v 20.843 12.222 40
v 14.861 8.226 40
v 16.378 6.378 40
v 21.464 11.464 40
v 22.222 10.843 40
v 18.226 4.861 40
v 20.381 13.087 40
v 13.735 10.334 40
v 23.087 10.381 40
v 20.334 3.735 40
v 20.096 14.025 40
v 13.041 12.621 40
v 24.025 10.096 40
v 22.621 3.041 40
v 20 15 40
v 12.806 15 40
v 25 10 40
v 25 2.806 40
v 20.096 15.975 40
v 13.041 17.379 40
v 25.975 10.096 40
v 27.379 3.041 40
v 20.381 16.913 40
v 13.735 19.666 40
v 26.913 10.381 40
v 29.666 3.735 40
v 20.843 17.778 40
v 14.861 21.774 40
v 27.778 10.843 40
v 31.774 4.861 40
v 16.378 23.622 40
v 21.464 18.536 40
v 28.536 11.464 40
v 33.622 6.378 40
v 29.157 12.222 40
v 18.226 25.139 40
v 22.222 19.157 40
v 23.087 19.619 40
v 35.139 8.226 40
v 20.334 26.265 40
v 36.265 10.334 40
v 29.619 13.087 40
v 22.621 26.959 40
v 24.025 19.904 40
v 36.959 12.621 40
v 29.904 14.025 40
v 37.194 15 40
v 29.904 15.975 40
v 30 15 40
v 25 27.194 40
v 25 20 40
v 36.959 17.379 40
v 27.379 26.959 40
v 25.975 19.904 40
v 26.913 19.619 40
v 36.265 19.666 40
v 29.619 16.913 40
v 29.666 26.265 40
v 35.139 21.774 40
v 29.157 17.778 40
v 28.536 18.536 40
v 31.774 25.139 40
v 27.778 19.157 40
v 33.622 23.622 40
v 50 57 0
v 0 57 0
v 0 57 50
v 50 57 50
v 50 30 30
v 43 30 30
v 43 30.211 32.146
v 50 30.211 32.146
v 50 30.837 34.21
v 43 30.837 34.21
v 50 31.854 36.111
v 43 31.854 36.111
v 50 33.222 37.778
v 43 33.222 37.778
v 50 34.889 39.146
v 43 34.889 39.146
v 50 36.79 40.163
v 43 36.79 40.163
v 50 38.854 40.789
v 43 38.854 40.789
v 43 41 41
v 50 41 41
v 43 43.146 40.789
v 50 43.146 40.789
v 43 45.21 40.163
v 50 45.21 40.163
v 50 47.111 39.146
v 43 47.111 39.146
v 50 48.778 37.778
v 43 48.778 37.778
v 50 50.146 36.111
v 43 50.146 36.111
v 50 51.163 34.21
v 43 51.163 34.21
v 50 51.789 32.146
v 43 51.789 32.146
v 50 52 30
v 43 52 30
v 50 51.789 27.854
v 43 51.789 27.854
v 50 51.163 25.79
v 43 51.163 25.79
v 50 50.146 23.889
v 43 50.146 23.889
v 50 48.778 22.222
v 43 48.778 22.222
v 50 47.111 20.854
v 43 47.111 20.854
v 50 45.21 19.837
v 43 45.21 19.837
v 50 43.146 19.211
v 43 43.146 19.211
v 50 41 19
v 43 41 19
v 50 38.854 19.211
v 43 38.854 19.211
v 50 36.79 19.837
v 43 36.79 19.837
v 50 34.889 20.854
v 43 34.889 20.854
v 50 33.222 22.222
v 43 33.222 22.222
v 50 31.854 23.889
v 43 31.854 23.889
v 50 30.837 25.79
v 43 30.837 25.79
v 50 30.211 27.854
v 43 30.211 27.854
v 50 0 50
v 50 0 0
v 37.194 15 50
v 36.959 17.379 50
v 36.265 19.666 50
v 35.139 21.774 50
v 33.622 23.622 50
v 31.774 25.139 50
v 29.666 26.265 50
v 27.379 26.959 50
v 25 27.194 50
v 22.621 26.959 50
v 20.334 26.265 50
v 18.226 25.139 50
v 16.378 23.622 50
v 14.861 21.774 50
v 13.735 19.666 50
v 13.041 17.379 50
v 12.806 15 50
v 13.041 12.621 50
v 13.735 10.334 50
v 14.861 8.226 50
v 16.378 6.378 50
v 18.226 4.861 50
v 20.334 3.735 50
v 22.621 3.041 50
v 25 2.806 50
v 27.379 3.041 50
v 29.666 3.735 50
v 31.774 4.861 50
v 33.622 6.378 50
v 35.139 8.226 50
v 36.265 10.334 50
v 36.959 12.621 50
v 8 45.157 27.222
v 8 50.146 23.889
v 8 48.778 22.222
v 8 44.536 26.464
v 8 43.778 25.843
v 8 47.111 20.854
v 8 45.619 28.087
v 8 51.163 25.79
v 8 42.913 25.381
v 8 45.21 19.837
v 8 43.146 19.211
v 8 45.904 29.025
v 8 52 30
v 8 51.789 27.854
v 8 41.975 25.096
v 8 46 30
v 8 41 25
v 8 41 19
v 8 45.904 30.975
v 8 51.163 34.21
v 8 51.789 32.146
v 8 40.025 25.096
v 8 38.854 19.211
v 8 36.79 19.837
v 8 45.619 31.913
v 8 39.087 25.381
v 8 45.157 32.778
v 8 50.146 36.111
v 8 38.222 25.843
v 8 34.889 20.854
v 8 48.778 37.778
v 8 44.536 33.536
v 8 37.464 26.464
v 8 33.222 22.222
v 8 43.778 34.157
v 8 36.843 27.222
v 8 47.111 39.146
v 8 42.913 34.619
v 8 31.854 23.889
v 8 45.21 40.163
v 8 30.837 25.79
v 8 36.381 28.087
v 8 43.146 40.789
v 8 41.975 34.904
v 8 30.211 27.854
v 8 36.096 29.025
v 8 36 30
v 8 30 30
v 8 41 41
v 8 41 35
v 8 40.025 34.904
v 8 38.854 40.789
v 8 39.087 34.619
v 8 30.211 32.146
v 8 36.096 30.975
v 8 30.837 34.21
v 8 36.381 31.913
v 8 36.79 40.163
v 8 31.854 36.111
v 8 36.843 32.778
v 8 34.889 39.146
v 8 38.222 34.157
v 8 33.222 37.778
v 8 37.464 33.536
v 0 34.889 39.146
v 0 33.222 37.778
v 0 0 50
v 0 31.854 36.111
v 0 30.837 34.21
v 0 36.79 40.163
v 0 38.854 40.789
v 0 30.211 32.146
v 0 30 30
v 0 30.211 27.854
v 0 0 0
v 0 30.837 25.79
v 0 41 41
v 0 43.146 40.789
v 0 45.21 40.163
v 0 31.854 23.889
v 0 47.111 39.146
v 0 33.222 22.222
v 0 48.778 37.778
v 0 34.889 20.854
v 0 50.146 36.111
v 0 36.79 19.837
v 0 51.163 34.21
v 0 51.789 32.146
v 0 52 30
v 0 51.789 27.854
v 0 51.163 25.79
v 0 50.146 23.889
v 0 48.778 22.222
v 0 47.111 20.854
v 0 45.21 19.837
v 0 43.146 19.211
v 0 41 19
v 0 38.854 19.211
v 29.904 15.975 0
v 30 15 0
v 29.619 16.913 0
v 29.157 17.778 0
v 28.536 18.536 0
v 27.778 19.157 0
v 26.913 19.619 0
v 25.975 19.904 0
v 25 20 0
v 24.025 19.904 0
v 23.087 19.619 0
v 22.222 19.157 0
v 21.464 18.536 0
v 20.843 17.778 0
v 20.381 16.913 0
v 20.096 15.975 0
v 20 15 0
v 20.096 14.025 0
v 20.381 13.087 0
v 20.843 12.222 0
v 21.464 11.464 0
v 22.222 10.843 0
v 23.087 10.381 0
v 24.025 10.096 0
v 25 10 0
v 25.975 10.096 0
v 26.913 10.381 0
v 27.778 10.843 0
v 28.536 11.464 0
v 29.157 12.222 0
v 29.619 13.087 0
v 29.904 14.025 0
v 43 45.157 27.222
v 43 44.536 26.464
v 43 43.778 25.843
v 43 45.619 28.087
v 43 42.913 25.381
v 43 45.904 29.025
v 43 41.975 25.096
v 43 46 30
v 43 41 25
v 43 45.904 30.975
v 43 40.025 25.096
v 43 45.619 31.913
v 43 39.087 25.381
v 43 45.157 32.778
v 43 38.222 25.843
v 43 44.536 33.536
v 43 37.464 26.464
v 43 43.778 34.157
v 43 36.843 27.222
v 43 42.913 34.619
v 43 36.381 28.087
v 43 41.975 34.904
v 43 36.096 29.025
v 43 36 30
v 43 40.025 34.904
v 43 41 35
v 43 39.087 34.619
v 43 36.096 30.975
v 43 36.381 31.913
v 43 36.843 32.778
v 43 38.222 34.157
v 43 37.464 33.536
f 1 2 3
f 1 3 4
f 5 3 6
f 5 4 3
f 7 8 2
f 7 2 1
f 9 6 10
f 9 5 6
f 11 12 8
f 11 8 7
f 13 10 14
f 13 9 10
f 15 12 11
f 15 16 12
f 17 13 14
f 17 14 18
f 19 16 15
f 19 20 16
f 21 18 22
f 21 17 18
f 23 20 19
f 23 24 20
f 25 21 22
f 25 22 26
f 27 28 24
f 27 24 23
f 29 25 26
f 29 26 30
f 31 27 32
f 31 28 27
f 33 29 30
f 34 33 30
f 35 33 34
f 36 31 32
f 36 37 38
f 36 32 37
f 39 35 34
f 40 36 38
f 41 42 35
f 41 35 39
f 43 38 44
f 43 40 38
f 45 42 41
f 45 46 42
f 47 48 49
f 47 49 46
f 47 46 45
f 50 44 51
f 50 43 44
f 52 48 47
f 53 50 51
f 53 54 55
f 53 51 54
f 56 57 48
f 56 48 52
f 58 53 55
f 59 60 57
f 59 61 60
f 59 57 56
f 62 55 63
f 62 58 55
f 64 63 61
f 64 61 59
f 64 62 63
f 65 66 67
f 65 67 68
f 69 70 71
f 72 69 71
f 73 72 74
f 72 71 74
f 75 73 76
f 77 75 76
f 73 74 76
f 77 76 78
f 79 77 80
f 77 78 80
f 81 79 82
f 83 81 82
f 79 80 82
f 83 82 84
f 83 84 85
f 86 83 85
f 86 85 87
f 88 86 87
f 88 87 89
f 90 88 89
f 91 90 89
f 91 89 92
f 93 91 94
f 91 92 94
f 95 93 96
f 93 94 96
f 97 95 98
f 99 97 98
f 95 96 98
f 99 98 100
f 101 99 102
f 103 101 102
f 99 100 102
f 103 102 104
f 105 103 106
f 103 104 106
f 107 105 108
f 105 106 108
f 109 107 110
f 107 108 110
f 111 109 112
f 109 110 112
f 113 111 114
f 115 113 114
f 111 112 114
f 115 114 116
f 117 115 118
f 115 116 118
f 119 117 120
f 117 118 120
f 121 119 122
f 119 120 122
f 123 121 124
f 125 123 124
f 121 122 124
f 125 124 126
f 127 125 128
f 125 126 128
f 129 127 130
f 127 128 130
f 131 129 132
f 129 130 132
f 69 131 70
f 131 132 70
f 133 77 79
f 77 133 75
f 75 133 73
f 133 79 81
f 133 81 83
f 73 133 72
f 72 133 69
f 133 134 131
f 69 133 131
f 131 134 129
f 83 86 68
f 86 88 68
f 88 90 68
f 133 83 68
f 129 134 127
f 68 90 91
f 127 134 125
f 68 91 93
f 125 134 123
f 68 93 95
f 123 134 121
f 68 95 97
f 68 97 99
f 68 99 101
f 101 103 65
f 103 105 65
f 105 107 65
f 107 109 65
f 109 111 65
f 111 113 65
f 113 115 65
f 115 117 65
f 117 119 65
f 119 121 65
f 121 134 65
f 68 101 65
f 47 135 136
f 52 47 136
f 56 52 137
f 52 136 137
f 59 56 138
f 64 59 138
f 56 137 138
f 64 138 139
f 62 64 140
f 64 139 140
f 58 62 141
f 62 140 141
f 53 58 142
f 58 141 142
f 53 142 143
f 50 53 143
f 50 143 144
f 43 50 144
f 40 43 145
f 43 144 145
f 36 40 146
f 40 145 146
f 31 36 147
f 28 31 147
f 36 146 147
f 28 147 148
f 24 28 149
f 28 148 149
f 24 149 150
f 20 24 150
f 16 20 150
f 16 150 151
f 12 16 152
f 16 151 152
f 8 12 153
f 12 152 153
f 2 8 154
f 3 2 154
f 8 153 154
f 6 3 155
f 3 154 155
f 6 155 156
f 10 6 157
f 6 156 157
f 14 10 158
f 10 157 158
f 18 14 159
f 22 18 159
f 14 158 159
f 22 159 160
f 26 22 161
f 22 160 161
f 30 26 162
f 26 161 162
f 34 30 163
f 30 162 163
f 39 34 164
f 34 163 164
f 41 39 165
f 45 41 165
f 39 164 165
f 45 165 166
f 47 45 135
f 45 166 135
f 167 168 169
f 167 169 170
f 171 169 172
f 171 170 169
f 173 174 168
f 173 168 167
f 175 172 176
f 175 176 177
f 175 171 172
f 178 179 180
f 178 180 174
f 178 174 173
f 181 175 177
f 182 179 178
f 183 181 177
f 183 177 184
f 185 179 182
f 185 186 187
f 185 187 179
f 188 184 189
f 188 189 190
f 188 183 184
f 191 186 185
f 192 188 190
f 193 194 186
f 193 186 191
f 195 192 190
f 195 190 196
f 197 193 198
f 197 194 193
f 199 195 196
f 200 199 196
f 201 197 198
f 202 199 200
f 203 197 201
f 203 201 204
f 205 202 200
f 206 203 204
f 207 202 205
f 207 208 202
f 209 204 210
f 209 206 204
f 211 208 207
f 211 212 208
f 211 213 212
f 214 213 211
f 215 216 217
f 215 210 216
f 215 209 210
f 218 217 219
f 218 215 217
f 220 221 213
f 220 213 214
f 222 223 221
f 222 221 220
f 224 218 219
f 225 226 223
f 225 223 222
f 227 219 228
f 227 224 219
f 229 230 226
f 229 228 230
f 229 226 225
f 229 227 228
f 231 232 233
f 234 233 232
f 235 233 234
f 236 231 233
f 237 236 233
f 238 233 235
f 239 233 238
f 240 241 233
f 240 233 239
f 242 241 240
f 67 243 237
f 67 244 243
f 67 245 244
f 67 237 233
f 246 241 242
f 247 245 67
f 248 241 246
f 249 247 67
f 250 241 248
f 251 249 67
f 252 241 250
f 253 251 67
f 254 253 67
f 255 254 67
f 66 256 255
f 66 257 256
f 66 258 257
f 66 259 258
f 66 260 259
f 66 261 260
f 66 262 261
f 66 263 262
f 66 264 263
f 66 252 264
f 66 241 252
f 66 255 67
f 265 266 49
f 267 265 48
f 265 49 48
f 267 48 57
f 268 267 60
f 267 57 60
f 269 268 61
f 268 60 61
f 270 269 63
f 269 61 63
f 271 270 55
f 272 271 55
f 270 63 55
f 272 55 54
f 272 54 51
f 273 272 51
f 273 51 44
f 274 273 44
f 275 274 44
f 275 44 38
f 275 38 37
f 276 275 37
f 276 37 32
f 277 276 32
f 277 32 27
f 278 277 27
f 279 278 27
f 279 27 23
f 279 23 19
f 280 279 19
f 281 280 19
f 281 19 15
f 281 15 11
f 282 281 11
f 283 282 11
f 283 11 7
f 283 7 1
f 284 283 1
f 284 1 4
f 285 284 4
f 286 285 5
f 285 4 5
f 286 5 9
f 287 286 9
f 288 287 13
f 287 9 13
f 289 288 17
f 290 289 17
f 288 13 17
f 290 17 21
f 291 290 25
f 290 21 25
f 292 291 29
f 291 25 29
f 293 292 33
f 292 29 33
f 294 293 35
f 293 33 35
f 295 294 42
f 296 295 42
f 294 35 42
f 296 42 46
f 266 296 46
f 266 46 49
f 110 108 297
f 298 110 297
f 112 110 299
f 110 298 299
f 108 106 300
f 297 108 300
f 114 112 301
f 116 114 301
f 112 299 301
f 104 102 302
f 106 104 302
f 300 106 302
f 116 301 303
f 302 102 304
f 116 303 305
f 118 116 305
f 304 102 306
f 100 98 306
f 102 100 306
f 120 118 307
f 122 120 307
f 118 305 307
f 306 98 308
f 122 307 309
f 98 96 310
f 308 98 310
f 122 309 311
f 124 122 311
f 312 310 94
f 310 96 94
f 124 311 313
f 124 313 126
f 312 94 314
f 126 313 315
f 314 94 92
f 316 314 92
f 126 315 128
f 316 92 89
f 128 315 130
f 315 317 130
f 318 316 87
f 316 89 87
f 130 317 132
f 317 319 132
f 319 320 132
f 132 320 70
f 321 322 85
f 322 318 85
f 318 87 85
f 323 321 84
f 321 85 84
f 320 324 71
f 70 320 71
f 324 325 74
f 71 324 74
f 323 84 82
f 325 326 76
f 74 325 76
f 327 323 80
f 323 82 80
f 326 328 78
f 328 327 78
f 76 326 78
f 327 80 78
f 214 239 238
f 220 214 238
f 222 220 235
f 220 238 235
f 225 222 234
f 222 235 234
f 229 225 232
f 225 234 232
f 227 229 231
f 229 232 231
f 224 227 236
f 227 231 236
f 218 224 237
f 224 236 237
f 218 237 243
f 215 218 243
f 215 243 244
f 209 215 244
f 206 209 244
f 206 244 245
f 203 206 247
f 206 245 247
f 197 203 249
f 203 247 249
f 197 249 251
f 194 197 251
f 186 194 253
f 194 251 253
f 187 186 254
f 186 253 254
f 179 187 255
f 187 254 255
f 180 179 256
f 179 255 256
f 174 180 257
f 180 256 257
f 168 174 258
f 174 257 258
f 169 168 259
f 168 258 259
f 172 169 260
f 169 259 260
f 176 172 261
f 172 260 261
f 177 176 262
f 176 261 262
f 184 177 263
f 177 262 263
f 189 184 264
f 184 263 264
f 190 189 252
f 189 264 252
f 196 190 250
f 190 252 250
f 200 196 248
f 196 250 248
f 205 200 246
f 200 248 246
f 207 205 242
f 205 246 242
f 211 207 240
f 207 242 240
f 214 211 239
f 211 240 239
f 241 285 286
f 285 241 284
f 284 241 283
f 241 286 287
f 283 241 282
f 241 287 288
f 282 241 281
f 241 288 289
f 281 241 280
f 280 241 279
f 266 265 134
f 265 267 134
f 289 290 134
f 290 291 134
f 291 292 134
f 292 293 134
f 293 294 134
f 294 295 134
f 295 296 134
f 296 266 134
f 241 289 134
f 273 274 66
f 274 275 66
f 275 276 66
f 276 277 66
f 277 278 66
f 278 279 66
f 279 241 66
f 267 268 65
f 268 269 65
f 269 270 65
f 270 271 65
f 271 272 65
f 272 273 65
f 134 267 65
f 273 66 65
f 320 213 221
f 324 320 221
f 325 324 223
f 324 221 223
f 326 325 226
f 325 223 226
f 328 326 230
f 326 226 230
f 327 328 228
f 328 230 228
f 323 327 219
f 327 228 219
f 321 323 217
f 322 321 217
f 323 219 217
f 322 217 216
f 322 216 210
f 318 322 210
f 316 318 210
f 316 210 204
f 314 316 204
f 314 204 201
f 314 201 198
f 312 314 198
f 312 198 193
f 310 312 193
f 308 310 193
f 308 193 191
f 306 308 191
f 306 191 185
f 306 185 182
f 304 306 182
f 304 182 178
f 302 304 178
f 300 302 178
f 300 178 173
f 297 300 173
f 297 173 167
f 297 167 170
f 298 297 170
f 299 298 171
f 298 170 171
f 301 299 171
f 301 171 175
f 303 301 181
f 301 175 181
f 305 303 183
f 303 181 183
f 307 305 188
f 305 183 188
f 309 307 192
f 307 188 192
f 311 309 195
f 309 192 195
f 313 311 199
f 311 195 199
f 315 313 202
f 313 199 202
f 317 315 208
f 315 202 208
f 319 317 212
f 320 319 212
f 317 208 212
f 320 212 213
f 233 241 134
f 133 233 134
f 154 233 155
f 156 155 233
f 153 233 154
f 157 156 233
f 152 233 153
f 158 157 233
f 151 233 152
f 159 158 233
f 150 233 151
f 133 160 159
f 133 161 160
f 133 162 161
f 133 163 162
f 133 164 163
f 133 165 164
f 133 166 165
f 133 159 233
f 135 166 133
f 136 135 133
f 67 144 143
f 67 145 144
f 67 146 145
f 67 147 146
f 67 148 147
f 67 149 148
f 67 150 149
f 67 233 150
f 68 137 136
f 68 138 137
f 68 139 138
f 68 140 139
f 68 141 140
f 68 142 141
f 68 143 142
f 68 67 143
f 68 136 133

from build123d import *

# Parameters (mm, degrees)
F0_W     = 50
F0_H     = 57
F1_DEPTH = 50
F2_R     = 5
F3_DEPTH = 50.001
F4_R     = 5
F5_DEPTH = 50.001
F4_R_2   = 11
F6_DEPTH = 8
F7_START = -43
F7_DEPTH = 7
F2_R_2   = 12.1936245424
F8_DEPTH = 10


with BuildPart() as f1:
    # F0 (on Top) → F1 (new body)
    with BuildSketch(Plane.XY):
        with Locations((25, 28.5)):
            Rectangle(F0_W, F0_H)
    extrude(amount=F1_DEPTH)

    # F2 (on face) → F3 (cut, through all)
    with BuildSketch(Plane.XY.offset(50)):
        with Locations((25, 15)):
            Circle(F2_R)
    extrude(amount=-F3_DEPTH, mode=Mode.SUBTRACT)

    # F4 (on face) → F5 (cut, through all)
    with BuildSketch(Plane(origin=(0, 0, 0), x_dir=(0, -1, 0), z_dir=(-1, 0, 0))):
        with Locations((-41, 30)):
            Circle(F4_R)
    extrude(amount=-F5_DEPTH, mode=Mode.SUBTRACT)

    # F4 (on face) → F6 (cut)
    with BuildSketch(Plane(origin=(0, 0, 0), x_dir=(0, -1, 0), z_dir=(-1, 0, 0))):
        with Locations((-41, 30)):
            Circle(F4_R_2)
        with Locations((-41, 30)):
            Circle(F4_R, mode=Mode.SUBTRACT)
    extrude(amount=-F6_DEPTH, mode=Mode.SUBTRACT)

    # F4 (on face) → F7 (cut)
    with BuildSketch(Plane(origin=(0, 0, 0), x_dir=(0, -1, 0), z_dir=(-1, 0, 0)).offset(F7_START)):
        with Locations((-41, 30)):
            Circle(F4_R_2)
        with Locations((-41, 30)):
            Circle(F4_R, mode=Mode.SUBTRACT)
    extrude(amount=-F7_DEPTH, mode=Mode.SUBTRACT)

    # F2 (on face) → F8 (cut)
    with BuildSketch(Plane.XY.offset(50)):
        with Locations((25, 15)):
            Circle(F2_R_2)
        with Locations((25, 15)):
            Circle(F2_R, mode=Mode.SUBTRACT)
    extrude(amount=-F8_DEPTH, mode=Mode.SUBTRACT)


solid = f1.part
